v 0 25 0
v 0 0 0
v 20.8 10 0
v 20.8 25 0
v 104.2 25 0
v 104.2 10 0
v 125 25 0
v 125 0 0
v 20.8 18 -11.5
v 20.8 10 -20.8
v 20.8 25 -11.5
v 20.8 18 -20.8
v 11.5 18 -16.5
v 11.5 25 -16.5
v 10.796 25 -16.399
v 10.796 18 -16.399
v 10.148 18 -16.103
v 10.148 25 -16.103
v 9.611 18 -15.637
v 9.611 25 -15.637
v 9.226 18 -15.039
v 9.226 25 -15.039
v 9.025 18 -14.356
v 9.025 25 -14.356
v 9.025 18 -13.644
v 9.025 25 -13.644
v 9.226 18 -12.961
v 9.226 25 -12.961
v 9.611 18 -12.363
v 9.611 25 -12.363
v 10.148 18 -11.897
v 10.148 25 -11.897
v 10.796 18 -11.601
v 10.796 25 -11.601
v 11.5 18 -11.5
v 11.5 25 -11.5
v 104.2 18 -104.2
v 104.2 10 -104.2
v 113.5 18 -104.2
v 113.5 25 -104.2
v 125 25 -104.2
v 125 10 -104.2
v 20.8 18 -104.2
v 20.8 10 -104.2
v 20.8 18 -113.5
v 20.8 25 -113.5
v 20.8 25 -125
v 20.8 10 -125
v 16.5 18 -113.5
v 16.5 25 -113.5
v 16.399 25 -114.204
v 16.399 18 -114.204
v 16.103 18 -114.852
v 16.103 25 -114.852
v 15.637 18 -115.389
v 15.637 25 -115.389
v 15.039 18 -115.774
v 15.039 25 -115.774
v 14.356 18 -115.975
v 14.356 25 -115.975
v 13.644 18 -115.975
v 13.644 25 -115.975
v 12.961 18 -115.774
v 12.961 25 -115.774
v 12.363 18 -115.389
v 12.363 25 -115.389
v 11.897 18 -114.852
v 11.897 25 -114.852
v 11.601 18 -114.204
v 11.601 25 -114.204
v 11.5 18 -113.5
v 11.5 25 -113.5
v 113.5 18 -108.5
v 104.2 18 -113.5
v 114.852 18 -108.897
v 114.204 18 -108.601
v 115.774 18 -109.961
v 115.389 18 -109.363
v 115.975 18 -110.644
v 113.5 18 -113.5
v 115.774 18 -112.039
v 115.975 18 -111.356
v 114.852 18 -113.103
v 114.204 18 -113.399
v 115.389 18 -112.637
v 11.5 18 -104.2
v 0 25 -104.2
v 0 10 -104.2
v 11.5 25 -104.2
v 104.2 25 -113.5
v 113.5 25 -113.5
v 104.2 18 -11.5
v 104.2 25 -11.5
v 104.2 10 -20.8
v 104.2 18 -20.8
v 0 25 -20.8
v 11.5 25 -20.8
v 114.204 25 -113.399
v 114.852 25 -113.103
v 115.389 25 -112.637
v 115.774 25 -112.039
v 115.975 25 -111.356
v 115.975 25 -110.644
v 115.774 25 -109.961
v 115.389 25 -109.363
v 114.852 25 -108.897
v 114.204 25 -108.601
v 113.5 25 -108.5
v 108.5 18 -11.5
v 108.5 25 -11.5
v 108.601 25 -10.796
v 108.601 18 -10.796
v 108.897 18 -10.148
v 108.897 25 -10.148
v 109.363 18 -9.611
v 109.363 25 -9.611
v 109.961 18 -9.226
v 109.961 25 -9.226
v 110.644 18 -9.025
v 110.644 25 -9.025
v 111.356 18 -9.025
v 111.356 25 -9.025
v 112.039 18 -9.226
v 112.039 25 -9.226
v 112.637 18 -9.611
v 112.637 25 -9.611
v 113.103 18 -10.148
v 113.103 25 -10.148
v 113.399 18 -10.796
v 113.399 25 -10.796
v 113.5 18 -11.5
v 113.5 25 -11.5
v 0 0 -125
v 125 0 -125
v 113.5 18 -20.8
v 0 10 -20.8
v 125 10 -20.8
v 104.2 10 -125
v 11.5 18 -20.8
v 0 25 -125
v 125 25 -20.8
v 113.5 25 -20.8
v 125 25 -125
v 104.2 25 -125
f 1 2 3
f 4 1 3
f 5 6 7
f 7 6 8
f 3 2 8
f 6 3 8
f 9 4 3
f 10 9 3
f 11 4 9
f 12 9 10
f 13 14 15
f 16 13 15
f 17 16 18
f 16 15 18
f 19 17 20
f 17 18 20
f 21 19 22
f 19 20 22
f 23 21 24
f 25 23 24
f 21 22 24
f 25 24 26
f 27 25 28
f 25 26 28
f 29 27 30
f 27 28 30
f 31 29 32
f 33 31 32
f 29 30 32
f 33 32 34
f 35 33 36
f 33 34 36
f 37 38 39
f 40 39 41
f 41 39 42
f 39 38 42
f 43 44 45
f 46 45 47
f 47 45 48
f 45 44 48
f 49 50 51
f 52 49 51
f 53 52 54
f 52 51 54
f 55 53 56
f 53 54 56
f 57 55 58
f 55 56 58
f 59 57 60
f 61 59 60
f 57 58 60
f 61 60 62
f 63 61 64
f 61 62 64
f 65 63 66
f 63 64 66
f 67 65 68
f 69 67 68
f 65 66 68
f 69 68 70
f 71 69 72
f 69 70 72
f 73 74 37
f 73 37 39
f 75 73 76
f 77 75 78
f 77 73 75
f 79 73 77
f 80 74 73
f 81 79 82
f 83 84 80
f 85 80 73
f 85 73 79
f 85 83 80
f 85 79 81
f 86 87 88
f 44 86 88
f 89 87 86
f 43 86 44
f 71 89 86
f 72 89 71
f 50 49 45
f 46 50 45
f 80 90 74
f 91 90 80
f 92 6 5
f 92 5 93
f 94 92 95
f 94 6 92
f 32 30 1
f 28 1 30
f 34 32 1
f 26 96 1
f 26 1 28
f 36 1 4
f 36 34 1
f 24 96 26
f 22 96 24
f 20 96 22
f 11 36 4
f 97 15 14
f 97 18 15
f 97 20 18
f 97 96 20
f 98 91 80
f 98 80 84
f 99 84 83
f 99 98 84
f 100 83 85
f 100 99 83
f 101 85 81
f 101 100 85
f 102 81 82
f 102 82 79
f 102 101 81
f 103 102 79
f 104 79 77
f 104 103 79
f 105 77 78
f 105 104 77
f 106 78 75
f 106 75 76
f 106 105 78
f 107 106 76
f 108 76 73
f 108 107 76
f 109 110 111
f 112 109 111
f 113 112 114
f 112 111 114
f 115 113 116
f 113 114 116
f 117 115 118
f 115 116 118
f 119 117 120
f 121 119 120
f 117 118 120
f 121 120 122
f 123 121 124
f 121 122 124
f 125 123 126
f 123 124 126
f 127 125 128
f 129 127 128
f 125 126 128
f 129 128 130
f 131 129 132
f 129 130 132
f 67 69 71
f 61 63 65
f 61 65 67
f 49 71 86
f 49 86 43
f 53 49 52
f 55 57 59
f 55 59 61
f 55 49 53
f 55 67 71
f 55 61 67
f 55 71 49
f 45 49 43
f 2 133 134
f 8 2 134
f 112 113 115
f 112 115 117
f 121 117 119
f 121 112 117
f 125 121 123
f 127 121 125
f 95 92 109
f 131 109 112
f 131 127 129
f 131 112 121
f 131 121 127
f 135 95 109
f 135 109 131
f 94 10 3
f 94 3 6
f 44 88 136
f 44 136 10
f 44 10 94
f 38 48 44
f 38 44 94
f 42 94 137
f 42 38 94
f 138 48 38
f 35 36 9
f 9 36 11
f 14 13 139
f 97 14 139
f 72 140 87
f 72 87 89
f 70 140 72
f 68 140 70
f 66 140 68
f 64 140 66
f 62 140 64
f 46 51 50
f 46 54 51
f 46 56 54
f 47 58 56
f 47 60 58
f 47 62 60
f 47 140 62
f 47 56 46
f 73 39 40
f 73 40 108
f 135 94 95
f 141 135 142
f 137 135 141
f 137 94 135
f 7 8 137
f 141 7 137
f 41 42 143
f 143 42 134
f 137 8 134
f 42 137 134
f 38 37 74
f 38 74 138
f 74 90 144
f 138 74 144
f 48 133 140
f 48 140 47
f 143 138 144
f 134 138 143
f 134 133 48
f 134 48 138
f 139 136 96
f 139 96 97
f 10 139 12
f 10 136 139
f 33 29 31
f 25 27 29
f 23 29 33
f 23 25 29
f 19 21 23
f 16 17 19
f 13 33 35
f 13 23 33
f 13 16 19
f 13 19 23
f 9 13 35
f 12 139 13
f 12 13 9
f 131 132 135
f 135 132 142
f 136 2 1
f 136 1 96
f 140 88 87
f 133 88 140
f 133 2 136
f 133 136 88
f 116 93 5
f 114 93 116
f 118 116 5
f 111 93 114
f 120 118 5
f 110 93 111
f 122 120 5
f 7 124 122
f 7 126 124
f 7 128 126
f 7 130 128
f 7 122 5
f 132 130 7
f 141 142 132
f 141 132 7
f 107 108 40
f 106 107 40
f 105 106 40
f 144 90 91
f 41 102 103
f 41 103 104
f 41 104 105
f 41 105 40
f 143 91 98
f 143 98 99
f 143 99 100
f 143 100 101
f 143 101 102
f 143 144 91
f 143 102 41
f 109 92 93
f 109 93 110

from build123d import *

# Parameters (mm, degrees)
SKETCH1_W           = 125
SKETCH1_H           = 125
BOSS_EXTRUDE1_DEPTH = 25
SKETCH2_W           = 102
SKETCH2_H           = 102
CUT_EXTRUDE1_DEPTH  = 15
SKETCH4_W           = 83.4
SKETCH4_H           = 11.5
SKETCH4_W_2         = 11.5
SKETCH4_H_2         = 83.4
CUT_EXTRUDE2_DEPTH  = 15
SKETCH5_W           = 9.3
SKETCH5_H           = 9.3
BOSS_EXTRUDE2_DEPTH = 8
CUT_EXTRUDE3_DEPTH  = 7


with BuildPart() as part:
    # Sketch1 → Boss-Extrude1 (new body)
    with BuildSketch(Plane(origin=(0, 0, 0), x_dir=(1, 0, 0), z_dir=(0, 1, 0))):
        with Locations((62.5, 62.5)):
            Rectangle(SKETCH1_W, SKETCH1_H)
    extrude(amount=BOSS_EXTRUDE1_DEPTH)

    # Sketch2 → Cut-Extrude1 (cut)
    with BuildSketch(Plane(origin=(0, 25, 0), x_dir=(1, 0, 0), z_dir=(0, 1, 0))):
        with Locations((62.5, 62.5)):
            Rectangle(SKETCH2_W, SKETCH2_H)
    extrude(amount=-CUT_EXTRUDE1_DEPTH, mode=Mode.SUBTRACT)

    # Sketch4 → Cut-Extrude2 (cut)
    with BuildSketch(Plane(origin=(0, 25, 0), x_dir=(1, 0, 0), z_dir=(0, 1, 0))):
        with Locations((62.5, 119.25)):
            Rectangle(SKETCH4_W, SKETCH4_H)
        with Locations((5.75, 62.5)):
            Rectangle(SKETCH4_W_2, SKETCH4_H_2)
        with Locations((62.5, 5.75)):
            Rectangle(SKETCH4_W, SKETCH4_H)
        with Locations((119.25, 62.5)):
            Rectangle(SKETCH4_W_2, SKETCH4_H_2)
    extrude(amount=-CUT_EXTRUDE2_DEPTH, mode=Mode.SUBTRACT)

    # Sketch5 → Boss-Extrude2 (add)
    with BuildSketch(Plane(origin=(0, 10, 0), x_dir=(1, 0, 0), z_dir=(0, 1, 0))):
        with Locations((108.85, 16.15)):
            Rectangle(SKETCH5_W, SKETCH5_H)
        with Locations((16.15, 16.15)):
            Rectangle(SKETCH5_W, SKETCH5_H)
        with Locations((16.15, 108.85)):
            Rectangle(SKETCH5_W, SKETCH5_H)
        with Locations((108.85, 108.85)):
            Rectangle(SKETCH5_W, SKETCH5_H)
    extrude(amount=BOSS_EXTRUDE2_DEPTH)

    # Sketch6 → Cut-Extrude3 (cut)
    with BuildSketch(Plane(origin=(0, 25, 0), x_dir=(1, 0, 0), z_dir=(0, 1, 0))):
        with BuildLine():
            Line((11.5, 11.5), (11.5, 16.5))
            ThreePointArc((11.5, 16.5), (9, 14), (11.5, 11.5))
        make_face()
        with BuildLine():
            Line((113.5, 11.5), (108.5, 11.5))
            ThreePointArc((108.5, 11.5), (111, 9), (113.5, 11.5))
        make_face()
        with BuildLine():
            Line((113.5, 108.5), (113.5, 113.5))
            ThreePointArc((113.5, 113.5), (116, 111), (113.5, 108.5))
        make_face()
        with BuildLine():
            Line((11.5, 113.5), (16.5, 113.5))
            ThreePointArc((16.5, 113.5), (14, 116), (11.5, 113.5))
        make_face()
    extrude(amount=-CUT_EXTRUDE3_DEPTH, mode=Mode.SUBTRACT)


solid = part.part
